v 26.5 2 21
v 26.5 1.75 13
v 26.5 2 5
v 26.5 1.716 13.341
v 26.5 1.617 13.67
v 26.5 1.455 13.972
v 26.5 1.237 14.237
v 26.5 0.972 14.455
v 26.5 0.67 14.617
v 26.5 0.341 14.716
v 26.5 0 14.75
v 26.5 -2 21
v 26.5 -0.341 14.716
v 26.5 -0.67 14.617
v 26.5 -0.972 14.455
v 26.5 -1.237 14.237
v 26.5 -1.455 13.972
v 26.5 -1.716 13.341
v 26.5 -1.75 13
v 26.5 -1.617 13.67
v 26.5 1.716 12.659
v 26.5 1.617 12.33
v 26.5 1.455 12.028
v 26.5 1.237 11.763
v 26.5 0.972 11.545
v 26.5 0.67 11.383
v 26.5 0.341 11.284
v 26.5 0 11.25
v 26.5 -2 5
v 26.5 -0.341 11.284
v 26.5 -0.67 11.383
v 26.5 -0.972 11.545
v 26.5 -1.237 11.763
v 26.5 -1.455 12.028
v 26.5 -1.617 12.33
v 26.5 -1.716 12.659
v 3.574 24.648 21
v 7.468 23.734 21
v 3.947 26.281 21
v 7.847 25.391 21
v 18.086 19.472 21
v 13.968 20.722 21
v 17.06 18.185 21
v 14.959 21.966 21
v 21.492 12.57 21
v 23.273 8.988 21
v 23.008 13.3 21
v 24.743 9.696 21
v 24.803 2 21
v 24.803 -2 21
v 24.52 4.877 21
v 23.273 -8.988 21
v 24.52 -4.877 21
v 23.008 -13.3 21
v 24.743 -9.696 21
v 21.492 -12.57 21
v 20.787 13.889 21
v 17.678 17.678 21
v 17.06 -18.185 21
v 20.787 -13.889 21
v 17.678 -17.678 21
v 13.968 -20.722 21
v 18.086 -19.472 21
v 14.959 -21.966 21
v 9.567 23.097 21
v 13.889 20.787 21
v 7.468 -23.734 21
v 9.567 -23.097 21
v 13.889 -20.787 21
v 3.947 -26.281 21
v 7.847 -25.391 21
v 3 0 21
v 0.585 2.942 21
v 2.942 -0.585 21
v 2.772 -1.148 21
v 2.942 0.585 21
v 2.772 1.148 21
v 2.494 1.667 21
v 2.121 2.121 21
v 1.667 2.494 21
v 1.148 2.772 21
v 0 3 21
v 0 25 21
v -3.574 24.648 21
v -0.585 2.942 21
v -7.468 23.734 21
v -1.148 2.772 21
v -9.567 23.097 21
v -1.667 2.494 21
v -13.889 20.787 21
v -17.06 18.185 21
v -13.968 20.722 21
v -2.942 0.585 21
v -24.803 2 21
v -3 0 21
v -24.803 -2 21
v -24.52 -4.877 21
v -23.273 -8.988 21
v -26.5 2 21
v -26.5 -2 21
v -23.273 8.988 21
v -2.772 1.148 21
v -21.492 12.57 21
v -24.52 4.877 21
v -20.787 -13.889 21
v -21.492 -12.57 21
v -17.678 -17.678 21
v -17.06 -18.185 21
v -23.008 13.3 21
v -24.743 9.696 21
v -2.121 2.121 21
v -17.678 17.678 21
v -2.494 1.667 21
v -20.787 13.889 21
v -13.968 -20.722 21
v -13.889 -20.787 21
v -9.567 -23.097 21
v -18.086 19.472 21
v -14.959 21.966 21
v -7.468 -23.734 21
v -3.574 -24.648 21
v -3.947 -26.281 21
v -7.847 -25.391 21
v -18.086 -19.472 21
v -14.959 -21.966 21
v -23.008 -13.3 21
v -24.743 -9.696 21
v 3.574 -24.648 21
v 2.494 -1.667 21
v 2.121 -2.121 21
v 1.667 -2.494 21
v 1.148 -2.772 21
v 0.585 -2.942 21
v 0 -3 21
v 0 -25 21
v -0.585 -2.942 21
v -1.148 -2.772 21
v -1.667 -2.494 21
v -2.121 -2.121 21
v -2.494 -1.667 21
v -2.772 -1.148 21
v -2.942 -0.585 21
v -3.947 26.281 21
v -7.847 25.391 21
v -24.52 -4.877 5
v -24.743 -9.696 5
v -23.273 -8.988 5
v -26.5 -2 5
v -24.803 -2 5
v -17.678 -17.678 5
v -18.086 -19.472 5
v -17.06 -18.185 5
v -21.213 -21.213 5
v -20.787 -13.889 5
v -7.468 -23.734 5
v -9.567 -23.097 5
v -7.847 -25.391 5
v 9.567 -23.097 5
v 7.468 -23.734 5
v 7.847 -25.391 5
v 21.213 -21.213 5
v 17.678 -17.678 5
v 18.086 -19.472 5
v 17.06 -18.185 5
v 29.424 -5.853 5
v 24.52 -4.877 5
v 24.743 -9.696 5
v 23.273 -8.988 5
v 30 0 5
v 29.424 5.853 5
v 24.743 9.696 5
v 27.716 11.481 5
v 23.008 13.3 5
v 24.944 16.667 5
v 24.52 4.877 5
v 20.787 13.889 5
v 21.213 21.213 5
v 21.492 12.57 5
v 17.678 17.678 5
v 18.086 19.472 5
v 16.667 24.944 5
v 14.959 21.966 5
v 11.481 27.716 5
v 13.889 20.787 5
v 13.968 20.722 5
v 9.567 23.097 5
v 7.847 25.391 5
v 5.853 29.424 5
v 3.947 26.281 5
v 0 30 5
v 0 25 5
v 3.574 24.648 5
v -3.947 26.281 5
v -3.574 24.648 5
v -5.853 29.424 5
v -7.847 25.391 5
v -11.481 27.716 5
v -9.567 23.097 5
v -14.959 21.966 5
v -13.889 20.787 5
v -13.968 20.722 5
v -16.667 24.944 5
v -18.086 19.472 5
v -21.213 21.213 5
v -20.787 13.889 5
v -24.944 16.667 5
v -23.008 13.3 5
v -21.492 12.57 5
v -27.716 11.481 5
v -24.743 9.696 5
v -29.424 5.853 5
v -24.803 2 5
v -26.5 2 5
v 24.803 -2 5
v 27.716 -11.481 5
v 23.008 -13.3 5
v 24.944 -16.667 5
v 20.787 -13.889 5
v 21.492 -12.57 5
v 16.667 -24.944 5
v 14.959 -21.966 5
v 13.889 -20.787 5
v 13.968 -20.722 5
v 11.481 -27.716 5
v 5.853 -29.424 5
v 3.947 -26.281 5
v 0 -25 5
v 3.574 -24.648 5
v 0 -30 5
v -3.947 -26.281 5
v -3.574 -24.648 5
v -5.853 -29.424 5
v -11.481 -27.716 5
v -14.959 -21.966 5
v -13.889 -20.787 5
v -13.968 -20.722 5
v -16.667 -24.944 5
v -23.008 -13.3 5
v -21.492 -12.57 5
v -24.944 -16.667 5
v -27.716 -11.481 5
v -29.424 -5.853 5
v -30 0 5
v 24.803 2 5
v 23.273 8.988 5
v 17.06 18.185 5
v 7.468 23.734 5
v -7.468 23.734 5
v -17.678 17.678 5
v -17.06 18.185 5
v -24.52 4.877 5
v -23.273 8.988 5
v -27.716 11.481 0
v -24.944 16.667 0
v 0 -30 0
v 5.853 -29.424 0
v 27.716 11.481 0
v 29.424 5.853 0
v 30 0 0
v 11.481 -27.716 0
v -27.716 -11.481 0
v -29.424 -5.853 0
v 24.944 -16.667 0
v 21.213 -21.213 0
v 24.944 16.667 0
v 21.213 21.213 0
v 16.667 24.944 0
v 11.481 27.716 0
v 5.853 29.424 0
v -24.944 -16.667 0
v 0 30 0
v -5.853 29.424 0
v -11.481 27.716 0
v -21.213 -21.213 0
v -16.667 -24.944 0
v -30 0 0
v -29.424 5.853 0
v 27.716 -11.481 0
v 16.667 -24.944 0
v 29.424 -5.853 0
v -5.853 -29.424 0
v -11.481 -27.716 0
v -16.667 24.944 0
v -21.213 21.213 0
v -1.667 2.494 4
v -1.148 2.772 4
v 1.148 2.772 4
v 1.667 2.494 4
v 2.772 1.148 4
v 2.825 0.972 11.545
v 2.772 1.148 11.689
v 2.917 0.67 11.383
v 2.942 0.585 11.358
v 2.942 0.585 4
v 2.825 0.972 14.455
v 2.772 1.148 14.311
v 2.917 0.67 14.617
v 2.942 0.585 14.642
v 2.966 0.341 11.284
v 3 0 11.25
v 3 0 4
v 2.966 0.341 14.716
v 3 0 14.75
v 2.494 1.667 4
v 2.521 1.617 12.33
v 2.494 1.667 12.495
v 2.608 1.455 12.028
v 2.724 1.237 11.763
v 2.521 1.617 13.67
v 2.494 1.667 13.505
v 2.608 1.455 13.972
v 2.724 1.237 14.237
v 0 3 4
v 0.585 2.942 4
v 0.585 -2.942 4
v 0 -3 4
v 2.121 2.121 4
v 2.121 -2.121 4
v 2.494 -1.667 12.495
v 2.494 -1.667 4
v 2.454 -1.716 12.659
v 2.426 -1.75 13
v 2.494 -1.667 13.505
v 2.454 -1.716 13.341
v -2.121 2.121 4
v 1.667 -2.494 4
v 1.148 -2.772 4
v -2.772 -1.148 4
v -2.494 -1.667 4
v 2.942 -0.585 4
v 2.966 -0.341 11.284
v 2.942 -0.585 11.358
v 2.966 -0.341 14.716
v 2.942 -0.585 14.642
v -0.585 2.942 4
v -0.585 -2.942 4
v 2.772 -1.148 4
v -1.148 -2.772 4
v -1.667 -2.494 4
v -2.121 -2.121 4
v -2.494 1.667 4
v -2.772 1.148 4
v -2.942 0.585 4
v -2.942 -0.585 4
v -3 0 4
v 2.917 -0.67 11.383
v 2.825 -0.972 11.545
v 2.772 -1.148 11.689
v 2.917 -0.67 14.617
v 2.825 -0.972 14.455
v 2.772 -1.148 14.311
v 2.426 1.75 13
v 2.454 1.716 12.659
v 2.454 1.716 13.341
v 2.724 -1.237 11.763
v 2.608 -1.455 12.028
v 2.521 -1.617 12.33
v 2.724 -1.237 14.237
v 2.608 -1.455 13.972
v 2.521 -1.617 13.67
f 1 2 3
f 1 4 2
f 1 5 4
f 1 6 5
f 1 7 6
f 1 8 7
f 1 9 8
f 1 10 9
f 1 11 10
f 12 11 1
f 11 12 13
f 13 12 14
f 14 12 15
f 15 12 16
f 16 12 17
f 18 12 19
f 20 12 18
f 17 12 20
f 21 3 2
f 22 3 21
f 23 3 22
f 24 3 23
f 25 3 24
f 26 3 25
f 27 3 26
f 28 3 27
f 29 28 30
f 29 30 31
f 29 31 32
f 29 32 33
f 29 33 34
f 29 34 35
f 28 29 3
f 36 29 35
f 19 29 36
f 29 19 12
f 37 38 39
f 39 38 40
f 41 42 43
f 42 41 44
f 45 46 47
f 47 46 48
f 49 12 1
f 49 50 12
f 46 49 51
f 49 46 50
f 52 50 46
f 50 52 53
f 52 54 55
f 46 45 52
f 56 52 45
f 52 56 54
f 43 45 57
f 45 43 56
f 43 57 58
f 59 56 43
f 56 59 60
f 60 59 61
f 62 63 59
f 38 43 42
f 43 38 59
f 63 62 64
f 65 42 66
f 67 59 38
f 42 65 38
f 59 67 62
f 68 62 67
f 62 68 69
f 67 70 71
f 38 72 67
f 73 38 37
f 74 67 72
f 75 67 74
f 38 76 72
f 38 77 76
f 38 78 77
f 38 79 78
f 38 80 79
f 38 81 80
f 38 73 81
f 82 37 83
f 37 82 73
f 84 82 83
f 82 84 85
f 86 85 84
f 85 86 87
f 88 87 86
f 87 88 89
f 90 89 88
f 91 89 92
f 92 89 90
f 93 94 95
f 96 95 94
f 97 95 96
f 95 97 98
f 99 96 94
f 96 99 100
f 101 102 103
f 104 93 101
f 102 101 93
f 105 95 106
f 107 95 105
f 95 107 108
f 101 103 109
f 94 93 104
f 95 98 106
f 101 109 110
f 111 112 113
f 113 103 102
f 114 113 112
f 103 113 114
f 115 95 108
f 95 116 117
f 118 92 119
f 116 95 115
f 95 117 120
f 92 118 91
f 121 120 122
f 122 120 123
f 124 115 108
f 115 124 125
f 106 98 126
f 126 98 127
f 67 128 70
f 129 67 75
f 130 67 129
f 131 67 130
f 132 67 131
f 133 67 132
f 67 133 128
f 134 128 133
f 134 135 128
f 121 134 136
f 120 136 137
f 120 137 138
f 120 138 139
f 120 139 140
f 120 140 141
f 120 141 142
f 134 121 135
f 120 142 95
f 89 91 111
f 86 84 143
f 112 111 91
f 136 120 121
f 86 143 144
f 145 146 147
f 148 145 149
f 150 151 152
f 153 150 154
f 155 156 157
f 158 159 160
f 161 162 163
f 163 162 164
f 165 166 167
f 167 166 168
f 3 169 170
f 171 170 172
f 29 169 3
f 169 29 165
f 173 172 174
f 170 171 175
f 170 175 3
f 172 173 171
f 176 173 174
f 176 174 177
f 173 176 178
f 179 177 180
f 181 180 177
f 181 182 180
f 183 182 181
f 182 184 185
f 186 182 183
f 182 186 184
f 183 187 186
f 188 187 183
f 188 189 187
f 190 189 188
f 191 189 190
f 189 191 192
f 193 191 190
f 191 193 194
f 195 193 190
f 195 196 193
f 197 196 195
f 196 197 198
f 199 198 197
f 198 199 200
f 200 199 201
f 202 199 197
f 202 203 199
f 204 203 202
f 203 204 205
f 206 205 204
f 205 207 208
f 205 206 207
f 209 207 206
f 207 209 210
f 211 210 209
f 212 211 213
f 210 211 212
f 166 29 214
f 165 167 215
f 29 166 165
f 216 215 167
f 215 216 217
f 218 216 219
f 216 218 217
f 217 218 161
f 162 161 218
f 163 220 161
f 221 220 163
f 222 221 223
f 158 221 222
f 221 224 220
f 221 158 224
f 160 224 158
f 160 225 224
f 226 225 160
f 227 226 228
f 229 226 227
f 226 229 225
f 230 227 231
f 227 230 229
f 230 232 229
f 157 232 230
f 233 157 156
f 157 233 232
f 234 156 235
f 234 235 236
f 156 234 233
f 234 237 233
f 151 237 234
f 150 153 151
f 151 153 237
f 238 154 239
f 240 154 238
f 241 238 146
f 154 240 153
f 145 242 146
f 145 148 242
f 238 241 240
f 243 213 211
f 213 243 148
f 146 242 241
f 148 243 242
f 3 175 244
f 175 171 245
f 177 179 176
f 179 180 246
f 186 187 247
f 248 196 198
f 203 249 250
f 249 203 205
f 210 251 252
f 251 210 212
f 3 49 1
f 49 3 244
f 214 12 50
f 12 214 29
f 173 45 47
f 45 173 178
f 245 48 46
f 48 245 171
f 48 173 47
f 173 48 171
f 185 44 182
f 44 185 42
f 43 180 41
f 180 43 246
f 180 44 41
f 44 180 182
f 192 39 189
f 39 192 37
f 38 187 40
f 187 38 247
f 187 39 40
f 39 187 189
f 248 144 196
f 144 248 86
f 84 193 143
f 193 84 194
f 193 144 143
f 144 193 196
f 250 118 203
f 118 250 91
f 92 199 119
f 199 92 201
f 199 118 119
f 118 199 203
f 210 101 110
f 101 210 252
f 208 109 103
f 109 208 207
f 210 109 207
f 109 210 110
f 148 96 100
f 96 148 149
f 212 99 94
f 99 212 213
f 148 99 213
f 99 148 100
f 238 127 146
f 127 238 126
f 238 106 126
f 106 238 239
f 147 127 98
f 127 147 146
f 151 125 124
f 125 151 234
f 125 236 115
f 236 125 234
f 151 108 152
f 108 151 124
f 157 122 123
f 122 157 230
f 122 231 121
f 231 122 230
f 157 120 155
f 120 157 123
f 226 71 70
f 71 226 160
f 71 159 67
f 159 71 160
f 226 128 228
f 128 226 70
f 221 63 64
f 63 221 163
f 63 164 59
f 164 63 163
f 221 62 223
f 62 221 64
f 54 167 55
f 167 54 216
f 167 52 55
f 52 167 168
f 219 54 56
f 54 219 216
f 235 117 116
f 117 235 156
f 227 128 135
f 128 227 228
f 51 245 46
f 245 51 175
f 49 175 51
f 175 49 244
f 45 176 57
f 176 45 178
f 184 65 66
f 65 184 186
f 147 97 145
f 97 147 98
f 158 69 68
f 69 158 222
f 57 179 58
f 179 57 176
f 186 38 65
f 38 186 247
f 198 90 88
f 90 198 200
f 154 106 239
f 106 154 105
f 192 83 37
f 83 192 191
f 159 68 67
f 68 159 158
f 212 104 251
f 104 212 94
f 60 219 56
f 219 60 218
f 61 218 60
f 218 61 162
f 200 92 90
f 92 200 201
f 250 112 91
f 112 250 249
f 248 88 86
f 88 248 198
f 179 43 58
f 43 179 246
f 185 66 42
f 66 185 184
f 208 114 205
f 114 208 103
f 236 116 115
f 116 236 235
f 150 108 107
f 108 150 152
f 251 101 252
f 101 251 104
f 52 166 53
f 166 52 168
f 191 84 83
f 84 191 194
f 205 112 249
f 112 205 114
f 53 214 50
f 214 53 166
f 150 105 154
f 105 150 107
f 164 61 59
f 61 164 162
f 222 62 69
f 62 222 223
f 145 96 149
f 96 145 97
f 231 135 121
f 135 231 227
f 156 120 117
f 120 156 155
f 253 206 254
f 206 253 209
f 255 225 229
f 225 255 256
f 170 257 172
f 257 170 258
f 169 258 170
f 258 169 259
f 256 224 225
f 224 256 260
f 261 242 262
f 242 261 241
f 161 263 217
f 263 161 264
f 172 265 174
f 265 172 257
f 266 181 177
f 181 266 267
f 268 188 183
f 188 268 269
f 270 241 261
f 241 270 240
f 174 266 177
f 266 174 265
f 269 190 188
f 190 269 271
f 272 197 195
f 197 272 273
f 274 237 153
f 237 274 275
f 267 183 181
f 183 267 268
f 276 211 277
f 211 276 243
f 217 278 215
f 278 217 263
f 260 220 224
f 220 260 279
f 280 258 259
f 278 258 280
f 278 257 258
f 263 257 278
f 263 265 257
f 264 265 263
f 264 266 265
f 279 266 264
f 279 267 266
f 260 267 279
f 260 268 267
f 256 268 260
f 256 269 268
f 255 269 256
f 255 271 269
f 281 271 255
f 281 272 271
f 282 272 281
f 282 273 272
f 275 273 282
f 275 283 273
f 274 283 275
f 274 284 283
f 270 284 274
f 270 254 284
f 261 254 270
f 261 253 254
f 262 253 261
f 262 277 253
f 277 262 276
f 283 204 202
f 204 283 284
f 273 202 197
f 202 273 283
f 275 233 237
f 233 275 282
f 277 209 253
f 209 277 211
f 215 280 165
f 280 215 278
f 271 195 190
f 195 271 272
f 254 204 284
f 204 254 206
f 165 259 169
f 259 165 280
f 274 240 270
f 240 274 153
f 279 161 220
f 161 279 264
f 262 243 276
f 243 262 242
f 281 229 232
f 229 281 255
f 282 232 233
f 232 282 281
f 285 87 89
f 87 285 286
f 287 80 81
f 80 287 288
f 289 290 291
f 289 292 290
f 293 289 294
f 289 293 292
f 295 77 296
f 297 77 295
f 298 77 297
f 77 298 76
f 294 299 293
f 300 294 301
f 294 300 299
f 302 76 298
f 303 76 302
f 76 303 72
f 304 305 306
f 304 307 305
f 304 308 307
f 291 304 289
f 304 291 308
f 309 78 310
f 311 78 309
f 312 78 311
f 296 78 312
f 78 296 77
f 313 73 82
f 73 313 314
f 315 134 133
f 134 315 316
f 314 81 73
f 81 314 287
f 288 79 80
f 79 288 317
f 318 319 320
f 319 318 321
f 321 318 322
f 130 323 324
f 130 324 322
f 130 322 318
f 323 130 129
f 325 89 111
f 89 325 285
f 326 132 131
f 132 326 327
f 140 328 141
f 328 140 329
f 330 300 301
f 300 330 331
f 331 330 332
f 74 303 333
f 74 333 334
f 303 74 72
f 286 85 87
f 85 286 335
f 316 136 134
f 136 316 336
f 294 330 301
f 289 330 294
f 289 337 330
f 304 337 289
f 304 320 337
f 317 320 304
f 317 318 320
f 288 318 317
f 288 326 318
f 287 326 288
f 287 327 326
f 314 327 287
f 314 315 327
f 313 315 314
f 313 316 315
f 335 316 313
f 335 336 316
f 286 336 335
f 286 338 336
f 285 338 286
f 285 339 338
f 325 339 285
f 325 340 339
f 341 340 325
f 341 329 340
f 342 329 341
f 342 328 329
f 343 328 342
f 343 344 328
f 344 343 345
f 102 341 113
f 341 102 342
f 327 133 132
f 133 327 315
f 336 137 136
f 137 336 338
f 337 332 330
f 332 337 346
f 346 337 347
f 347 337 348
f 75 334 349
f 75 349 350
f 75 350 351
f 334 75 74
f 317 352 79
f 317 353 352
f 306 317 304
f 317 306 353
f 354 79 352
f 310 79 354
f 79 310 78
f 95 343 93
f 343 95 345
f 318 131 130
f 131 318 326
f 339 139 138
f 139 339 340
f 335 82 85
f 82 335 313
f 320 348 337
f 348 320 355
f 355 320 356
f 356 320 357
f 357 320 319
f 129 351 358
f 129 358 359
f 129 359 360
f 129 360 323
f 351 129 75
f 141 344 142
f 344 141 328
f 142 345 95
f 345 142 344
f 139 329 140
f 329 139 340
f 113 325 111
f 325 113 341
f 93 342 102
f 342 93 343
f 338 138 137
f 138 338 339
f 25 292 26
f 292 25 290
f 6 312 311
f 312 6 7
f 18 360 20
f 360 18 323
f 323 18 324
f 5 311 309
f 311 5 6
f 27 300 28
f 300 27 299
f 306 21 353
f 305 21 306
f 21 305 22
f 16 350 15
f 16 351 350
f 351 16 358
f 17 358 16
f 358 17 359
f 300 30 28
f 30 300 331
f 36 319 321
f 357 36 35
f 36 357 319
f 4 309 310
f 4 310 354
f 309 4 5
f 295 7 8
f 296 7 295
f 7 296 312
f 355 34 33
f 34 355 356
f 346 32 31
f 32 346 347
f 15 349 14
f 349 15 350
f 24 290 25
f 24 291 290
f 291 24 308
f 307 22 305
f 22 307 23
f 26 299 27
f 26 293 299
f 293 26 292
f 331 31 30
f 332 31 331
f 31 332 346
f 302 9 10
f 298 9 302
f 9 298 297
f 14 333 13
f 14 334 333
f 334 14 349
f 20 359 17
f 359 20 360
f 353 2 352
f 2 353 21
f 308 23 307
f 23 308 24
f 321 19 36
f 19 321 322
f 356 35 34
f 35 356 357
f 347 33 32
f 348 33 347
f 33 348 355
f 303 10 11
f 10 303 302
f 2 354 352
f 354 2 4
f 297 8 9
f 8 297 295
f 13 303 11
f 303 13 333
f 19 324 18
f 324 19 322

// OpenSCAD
$fn = 32;

// ----------------------------------------------------------------------
// Control knob: skirt knob with grip ribs
// ----------------------------------------------------------------------

// --- parameters (mm) ---
skirt_d = 60;             // skirt diameter
skirt_t = 5;              // skirt thickness
rib_w = 4;                // grip rib width
rib_out = 2.5;            // grip rib radial protrusion
n_ribs = 14;              // number of grip ribs
knob_d = 50;              // knob body diameter
knob_h = 16;              // knob body height
bore_d = 6;               // shaft bore diameter
set_d = 3.5;              // set screw bore diameter

rib_step = 360 / n_ribs;  // rib angular step
total_h = skirt_t + knob_h;  // overall height

difference() {
  union() {
    translate([0, 0, skirt_t]) cylinder(h = knob_h, d = knob_d);
    cylinder(h = skirt_t, d = skirt_d);
    for (i = [0 : n_ribs - 1])
      rotate([0, 0, i * rib_step])
        translate([knob_d / 2 - 1, -rib_w / 2, skirt_t])
          cube([rib_out, rib_w, knob_h]);
  }
  translate([0, 0, skirt_t - 1]) cylinder(h = knob_h + 2, d = bore_d);
  translate([-1, 0, skirt_t + knob_h / 2]) rotate([0, 90, 0])
    cylinder(h = knob_d / 2 + bore_d / 2 + 2, d = set_d);
}
